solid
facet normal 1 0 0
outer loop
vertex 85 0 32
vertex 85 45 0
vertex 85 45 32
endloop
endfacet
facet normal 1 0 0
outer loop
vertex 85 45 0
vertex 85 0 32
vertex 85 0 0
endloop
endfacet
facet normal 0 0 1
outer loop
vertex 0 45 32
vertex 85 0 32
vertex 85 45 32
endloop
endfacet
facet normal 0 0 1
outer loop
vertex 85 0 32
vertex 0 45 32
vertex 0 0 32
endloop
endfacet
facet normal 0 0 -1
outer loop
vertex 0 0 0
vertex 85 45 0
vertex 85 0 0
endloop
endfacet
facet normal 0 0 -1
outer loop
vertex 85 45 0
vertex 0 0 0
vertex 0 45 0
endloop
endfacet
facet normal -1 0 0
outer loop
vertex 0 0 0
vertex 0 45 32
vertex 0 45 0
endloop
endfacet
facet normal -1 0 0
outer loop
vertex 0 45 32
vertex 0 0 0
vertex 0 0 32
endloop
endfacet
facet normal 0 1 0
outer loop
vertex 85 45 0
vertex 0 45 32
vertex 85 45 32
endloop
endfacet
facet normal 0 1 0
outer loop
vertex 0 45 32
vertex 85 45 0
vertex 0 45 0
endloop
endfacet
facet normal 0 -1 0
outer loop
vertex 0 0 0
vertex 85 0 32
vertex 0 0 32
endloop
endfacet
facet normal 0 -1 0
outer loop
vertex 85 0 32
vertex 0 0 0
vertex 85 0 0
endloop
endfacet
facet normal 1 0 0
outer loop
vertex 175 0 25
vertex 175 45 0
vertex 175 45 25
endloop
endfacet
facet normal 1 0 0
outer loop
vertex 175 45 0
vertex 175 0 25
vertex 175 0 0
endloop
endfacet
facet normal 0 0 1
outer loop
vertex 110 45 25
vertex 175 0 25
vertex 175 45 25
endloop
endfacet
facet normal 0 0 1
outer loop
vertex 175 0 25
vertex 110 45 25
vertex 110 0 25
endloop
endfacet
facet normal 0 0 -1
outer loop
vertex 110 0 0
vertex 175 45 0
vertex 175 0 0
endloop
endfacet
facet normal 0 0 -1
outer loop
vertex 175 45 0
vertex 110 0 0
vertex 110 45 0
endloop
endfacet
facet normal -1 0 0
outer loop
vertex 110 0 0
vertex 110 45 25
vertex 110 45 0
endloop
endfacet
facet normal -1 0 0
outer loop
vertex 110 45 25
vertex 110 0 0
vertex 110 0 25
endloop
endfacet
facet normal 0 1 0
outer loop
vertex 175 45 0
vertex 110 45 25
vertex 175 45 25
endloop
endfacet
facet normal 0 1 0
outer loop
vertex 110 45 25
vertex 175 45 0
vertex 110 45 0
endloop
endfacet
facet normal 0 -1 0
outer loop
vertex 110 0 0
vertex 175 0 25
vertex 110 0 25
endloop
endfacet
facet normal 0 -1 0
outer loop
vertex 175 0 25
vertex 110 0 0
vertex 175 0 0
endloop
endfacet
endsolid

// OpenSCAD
color([.1,.18,.12])cube([85,45,32]);translate([110,0,0])color([.12,.12,.12])cube([65,45,25]);
